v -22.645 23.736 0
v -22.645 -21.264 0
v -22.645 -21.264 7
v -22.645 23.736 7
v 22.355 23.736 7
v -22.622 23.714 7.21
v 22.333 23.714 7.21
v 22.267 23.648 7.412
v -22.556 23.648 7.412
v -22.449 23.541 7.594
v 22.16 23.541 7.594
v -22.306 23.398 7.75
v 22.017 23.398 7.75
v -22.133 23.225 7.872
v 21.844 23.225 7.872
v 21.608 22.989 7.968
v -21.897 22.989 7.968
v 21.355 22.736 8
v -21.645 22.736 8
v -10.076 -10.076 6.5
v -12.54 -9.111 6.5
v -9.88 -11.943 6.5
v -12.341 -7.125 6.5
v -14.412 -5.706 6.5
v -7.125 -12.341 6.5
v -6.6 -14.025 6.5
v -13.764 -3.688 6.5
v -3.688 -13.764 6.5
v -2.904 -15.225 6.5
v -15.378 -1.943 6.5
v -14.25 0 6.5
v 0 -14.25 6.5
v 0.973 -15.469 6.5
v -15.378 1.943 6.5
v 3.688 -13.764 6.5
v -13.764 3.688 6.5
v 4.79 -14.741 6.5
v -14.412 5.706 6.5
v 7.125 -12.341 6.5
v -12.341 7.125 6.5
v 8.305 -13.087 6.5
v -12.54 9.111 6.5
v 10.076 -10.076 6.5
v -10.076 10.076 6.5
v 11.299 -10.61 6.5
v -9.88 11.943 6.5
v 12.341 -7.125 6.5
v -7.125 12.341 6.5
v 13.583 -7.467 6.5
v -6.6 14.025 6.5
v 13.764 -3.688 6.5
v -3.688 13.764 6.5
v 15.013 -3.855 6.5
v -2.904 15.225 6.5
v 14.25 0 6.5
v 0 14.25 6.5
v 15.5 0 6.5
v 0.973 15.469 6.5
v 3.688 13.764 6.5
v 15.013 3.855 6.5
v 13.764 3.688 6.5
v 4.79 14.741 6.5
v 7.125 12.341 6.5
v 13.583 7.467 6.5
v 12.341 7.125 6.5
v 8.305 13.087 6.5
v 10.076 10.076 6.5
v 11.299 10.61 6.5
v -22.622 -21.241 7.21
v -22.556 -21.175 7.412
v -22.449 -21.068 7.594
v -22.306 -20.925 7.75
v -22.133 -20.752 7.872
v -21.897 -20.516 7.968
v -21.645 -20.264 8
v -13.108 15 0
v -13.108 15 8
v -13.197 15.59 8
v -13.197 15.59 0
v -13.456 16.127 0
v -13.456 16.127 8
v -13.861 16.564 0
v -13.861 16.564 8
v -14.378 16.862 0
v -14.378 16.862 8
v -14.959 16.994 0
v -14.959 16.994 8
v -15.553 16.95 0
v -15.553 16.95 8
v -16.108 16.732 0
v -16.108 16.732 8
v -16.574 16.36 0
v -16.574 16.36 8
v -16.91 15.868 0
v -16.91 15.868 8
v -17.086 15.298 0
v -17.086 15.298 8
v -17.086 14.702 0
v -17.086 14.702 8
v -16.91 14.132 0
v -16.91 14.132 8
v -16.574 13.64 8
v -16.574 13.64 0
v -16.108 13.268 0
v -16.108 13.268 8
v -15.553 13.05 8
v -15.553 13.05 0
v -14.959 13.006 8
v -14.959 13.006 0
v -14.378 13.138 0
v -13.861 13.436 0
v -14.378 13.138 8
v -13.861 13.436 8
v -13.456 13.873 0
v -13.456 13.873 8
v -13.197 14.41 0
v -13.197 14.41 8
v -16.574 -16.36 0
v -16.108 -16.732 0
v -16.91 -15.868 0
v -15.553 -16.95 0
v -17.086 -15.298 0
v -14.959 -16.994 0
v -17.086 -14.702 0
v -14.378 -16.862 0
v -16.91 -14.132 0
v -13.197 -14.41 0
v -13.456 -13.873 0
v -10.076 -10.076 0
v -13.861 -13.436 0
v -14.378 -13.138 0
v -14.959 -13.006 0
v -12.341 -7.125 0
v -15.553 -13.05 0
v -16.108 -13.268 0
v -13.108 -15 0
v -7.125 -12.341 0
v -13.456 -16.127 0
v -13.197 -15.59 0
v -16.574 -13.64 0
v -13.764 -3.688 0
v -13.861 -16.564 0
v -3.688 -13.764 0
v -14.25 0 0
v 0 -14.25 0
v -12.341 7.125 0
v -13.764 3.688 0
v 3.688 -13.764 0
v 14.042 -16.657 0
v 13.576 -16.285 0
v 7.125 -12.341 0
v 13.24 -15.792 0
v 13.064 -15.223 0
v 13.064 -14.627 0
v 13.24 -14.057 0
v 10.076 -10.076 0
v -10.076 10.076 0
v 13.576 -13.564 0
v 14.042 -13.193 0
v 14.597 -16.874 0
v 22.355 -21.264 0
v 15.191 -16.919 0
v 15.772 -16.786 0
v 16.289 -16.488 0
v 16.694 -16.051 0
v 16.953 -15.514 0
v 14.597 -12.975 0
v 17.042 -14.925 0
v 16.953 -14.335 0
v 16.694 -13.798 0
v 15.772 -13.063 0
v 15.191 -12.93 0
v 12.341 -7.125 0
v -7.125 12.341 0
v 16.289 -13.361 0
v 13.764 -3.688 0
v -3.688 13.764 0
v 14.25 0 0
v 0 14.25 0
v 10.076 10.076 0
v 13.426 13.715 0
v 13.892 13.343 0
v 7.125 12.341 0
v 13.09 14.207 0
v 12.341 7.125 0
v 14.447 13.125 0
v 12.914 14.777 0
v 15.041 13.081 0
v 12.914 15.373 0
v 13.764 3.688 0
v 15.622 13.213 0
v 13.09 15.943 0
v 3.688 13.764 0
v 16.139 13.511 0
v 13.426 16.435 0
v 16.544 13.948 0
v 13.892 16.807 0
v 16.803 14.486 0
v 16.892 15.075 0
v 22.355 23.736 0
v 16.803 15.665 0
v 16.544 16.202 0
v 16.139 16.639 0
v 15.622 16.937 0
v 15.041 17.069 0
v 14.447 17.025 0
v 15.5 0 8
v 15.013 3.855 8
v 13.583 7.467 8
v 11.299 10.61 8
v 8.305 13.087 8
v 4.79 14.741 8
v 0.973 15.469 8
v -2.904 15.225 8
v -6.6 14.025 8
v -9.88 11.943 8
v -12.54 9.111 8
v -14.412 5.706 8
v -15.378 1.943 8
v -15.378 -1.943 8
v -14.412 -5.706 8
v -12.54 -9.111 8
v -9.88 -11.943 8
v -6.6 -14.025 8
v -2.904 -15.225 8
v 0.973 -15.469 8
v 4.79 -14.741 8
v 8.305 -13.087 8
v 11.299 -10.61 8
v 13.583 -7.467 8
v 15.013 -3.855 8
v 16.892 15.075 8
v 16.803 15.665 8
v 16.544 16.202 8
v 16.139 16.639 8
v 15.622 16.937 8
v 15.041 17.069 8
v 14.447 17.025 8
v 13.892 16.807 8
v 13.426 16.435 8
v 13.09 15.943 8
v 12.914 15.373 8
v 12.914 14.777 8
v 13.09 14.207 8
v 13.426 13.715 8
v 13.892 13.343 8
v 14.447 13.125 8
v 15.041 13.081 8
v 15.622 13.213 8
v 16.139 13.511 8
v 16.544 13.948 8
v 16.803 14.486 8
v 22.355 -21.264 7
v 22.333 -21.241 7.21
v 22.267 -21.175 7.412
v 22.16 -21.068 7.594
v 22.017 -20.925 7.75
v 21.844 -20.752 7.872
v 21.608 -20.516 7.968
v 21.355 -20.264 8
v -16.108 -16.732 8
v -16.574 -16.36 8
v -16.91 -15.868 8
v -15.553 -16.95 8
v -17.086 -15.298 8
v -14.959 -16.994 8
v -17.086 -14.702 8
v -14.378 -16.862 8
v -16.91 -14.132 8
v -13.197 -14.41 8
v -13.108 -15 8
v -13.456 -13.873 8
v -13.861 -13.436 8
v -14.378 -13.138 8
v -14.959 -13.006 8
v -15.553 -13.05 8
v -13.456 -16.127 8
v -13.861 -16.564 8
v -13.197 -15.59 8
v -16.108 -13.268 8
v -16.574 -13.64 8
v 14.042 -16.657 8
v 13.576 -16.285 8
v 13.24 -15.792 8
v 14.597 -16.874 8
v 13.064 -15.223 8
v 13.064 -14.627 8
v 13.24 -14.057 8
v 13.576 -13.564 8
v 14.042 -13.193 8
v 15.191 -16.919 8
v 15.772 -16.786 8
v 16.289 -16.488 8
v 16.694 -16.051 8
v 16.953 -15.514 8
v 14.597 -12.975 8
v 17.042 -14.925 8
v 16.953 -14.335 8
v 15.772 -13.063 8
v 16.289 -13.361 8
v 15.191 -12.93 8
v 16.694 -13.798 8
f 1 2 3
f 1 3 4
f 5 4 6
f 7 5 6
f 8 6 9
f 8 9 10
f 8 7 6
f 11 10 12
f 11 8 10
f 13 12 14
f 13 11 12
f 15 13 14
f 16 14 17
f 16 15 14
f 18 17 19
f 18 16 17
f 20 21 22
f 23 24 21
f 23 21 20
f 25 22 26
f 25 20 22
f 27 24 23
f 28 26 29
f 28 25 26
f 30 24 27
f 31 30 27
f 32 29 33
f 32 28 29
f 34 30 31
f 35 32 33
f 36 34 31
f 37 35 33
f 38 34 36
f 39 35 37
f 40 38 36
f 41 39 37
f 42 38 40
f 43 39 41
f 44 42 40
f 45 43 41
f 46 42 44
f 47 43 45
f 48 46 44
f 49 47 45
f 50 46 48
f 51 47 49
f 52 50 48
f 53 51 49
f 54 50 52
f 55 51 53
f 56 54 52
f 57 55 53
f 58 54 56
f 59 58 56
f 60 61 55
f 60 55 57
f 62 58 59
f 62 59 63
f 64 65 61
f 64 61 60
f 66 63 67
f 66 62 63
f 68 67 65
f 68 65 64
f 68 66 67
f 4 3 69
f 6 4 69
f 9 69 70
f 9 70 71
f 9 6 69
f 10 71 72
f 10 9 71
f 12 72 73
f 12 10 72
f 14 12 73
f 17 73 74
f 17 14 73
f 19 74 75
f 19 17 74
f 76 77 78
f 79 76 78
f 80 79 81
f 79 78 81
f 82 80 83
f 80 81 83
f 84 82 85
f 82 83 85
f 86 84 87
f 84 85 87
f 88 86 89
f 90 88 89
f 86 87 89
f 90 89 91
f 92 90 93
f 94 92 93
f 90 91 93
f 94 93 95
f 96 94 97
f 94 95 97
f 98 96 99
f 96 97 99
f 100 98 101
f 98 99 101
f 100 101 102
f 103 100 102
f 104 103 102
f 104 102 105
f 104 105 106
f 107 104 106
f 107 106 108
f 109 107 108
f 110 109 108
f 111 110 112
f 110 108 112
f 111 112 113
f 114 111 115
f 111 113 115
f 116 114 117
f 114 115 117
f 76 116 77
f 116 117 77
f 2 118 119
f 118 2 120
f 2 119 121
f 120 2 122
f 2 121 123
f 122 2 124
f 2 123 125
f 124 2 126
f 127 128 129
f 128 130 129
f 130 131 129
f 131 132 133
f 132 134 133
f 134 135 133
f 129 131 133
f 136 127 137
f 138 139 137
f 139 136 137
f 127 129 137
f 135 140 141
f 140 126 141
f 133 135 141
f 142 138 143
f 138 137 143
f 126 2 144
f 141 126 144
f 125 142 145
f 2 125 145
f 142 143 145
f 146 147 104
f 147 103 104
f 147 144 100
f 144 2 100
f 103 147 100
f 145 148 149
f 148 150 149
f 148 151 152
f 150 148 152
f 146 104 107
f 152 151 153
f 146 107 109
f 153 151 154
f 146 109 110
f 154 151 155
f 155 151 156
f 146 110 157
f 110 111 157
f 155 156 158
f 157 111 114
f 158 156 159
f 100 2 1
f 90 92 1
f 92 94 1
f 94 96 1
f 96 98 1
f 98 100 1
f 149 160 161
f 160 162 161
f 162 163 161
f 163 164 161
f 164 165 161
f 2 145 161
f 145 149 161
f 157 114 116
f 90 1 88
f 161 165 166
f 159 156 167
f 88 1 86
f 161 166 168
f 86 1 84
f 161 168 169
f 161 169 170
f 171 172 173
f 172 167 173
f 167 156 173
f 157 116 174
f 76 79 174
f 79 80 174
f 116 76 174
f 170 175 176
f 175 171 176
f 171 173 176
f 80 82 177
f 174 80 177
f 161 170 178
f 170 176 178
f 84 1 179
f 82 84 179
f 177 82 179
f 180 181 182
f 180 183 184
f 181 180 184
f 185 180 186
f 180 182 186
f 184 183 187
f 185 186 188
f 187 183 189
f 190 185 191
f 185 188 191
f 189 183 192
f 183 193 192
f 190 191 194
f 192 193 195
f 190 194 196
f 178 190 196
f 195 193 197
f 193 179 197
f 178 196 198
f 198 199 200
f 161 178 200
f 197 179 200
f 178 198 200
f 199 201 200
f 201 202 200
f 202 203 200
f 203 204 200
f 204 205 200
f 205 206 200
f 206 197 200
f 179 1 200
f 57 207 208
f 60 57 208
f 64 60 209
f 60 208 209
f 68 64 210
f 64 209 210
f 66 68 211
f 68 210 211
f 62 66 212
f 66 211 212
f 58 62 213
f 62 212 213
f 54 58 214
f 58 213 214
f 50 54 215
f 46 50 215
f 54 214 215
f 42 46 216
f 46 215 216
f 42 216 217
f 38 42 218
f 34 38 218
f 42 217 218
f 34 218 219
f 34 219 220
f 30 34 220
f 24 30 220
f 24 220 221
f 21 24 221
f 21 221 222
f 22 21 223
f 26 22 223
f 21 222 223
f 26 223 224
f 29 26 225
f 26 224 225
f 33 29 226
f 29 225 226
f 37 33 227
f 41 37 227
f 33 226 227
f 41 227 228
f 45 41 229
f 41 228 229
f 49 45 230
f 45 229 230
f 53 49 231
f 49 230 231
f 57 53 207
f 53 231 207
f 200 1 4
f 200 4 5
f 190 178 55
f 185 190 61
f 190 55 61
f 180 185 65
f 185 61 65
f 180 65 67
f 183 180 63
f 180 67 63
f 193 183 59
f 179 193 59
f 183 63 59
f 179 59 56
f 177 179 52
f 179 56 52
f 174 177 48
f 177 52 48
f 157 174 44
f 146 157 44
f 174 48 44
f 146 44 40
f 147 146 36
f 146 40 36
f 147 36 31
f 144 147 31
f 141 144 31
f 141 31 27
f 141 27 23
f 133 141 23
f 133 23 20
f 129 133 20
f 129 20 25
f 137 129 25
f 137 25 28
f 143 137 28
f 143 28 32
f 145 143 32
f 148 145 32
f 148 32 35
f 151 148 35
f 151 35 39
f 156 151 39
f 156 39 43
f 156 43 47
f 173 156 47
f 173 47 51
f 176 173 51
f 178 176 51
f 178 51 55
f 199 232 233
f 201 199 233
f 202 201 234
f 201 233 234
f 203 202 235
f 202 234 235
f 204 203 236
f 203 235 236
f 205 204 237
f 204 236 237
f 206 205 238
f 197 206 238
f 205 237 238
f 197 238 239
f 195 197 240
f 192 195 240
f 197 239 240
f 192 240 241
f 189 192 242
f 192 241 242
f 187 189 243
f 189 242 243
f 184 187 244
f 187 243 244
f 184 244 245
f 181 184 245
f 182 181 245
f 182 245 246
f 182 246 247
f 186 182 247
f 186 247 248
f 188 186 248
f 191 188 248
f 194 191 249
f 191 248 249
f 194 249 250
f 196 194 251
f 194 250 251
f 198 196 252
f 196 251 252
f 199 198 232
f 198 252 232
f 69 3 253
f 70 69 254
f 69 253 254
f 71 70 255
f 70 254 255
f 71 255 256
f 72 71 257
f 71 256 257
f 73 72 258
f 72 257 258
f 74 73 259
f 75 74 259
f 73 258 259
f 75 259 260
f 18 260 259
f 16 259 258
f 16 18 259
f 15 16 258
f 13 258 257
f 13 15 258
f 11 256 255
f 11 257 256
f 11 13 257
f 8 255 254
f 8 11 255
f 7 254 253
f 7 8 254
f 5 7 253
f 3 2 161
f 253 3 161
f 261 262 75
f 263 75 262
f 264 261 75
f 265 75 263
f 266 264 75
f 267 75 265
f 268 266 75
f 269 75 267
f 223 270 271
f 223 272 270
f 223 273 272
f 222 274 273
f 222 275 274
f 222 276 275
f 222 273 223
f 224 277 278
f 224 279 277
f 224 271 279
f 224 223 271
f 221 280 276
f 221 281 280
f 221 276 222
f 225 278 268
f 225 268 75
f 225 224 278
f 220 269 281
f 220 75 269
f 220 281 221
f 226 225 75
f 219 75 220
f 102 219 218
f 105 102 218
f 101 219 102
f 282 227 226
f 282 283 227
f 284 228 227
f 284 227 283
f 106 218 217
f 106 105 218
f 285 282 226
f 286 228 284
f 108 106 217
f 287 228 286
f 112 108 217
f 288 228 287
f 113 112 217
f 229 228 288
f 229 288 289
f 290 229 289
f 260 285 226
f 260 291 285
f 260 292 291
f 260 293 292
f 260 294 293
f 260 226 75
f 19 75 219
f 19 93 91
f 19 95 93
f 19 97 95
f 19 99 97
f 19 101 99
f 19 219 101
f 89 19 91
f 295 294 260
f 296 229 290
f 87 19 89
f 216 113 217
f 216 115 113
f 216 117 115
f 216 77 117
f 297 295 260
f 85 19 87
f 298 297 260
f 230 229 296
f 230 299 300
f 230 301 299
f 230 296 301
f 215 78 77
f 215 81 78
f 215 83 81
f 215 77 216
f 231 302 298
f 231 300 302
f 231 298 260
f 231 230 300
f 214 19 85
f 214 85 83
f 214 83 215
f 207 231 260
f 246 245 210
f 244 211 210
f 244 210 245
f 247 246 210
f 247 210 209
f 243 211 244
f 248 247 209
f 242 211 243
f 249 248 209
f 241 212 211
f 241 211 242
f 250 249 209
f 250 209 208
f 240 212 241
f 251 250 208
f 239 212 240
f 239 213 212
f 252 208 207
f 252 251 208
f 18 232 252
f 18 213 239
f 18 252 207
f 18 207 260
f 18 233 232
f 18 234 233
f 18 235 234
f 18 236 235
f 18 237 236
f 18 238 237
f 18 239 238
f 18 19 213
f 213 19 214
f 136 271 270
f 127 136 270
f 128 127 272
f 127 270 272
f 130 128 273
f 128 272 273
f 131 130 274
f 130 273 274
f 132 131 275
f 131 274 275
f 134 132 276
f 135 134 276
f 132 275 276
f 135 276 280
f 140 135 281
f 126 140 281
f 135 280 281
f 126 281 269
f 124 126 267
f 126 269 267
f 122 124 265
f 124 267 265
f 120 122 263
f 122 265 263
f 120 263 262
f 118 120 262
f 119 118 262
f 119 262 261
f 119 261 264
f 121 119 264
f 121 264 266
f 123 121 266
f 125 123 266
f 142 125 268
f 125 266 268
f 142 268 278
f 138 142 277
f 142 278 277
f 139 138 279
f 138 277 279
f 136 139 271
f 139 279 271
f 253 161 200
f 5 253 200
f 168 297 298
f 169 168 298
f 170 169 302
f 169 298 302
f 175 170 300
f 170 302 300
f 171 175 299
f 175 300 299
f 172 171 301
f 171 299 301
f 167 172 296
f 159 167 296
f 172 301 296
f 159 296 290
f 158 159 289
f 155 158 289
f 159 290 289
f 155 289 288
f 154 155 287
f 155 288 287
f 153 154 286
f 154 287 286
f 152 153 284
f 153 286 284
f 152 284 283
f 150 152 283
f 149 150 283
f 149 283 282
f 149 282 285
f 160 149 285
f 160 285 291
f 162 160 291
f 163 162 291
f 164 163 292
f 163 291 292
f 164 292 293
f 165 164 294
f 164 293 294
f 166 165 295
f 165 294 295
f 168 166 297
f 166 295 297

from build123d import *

# Parameters (mm, degrees)
F0_W          = 45
F0_H          = 45
F1_DEPTH      = 8
F2_R          = 14.25
F3_DEPTH      = 69
F3_DEPTH_BACK = 8
F4_W          = 45
F4_H          = 45
F4_R          = 15.5
F5_DEPTH      = 1.5
F6_R          = 1
F7_R          = 2
F8_DEPTH      = 8
F9_DEPTH      = 1.5


# Not quite as in the source:
# - an extrude ends at something that could not be found from the text; its depth is read off the source's solid


with BuildPart() as f1:
    # F0 (on Top) → F1 (new body)
    with BuildSketch(Plane.XY):
        with Locations((-0.144558493, 1.2362819078)):
            Rectangle(F0_W, F0_H)
    extrude(amount=F1_DEPTH)

    # F2 (on face) → F3 (cut, two sides)
    with BuildSketch(Plane.XY.offset(8)) as f3_sk:
        Circle(F2_R)
    extrude(amount=F3_DEPTH, mode=Mode.SUBTRACT)
    extrude(f3_sk.sketch, amount=-F3_DEPTH_BACK, mode=Mode.SUBTRACT)

    # F4 (on face) → F5 (cut)
    with BuildSketch(Plane.XY.offset(8)):
        with Locations((-0.144558493, 1.2362819078)):
            Rectangle(F4_W, F4_H)
        Circle(F4_R, mode=Mode.SUBTRACT)
    extrude(amount=F5_DEPTH, mode=Mode.SUBTRACT)

    # F6
    f6_edges = [f1.edges().sort_by_distance(p)[0] for p in [
        (-0.144558, 23.736282, 8),
        (-22.644558, 1.236282, 8),
        (-0.144558, -21.263718, 8),
        (22.355442, 1.236282, 8),
    ]]
    fillet(f6_edges, radius=F6_R)

    # F7 (on face) → F8 (cut)
    with BuildSketch(Plane.XY.offset(8)):
        with Locations((-15.1081832213, 15)):
            Circle(F7_R)
        with Locations((14.8917229997, 15.0750115548)):
            Circle(F7_R)
        with Locations((15.0417456403, -14.9246133297)):
            Circle(F7_R)
        with Locations((-15.1081832213, -15)):
            Circle(F7_R)
    extrude(amount=-F8_DEPTH, mode=Mode.SUBTRACT)

    # F4 (on face) → F9 (cut)
    with BuildSketch(Plane.XY.offset(8)):
        Circle(F4_R)
    extrude(amount=-F9_DEPTH, mode=Mode.SUBTRACT)


solid = f1.part
